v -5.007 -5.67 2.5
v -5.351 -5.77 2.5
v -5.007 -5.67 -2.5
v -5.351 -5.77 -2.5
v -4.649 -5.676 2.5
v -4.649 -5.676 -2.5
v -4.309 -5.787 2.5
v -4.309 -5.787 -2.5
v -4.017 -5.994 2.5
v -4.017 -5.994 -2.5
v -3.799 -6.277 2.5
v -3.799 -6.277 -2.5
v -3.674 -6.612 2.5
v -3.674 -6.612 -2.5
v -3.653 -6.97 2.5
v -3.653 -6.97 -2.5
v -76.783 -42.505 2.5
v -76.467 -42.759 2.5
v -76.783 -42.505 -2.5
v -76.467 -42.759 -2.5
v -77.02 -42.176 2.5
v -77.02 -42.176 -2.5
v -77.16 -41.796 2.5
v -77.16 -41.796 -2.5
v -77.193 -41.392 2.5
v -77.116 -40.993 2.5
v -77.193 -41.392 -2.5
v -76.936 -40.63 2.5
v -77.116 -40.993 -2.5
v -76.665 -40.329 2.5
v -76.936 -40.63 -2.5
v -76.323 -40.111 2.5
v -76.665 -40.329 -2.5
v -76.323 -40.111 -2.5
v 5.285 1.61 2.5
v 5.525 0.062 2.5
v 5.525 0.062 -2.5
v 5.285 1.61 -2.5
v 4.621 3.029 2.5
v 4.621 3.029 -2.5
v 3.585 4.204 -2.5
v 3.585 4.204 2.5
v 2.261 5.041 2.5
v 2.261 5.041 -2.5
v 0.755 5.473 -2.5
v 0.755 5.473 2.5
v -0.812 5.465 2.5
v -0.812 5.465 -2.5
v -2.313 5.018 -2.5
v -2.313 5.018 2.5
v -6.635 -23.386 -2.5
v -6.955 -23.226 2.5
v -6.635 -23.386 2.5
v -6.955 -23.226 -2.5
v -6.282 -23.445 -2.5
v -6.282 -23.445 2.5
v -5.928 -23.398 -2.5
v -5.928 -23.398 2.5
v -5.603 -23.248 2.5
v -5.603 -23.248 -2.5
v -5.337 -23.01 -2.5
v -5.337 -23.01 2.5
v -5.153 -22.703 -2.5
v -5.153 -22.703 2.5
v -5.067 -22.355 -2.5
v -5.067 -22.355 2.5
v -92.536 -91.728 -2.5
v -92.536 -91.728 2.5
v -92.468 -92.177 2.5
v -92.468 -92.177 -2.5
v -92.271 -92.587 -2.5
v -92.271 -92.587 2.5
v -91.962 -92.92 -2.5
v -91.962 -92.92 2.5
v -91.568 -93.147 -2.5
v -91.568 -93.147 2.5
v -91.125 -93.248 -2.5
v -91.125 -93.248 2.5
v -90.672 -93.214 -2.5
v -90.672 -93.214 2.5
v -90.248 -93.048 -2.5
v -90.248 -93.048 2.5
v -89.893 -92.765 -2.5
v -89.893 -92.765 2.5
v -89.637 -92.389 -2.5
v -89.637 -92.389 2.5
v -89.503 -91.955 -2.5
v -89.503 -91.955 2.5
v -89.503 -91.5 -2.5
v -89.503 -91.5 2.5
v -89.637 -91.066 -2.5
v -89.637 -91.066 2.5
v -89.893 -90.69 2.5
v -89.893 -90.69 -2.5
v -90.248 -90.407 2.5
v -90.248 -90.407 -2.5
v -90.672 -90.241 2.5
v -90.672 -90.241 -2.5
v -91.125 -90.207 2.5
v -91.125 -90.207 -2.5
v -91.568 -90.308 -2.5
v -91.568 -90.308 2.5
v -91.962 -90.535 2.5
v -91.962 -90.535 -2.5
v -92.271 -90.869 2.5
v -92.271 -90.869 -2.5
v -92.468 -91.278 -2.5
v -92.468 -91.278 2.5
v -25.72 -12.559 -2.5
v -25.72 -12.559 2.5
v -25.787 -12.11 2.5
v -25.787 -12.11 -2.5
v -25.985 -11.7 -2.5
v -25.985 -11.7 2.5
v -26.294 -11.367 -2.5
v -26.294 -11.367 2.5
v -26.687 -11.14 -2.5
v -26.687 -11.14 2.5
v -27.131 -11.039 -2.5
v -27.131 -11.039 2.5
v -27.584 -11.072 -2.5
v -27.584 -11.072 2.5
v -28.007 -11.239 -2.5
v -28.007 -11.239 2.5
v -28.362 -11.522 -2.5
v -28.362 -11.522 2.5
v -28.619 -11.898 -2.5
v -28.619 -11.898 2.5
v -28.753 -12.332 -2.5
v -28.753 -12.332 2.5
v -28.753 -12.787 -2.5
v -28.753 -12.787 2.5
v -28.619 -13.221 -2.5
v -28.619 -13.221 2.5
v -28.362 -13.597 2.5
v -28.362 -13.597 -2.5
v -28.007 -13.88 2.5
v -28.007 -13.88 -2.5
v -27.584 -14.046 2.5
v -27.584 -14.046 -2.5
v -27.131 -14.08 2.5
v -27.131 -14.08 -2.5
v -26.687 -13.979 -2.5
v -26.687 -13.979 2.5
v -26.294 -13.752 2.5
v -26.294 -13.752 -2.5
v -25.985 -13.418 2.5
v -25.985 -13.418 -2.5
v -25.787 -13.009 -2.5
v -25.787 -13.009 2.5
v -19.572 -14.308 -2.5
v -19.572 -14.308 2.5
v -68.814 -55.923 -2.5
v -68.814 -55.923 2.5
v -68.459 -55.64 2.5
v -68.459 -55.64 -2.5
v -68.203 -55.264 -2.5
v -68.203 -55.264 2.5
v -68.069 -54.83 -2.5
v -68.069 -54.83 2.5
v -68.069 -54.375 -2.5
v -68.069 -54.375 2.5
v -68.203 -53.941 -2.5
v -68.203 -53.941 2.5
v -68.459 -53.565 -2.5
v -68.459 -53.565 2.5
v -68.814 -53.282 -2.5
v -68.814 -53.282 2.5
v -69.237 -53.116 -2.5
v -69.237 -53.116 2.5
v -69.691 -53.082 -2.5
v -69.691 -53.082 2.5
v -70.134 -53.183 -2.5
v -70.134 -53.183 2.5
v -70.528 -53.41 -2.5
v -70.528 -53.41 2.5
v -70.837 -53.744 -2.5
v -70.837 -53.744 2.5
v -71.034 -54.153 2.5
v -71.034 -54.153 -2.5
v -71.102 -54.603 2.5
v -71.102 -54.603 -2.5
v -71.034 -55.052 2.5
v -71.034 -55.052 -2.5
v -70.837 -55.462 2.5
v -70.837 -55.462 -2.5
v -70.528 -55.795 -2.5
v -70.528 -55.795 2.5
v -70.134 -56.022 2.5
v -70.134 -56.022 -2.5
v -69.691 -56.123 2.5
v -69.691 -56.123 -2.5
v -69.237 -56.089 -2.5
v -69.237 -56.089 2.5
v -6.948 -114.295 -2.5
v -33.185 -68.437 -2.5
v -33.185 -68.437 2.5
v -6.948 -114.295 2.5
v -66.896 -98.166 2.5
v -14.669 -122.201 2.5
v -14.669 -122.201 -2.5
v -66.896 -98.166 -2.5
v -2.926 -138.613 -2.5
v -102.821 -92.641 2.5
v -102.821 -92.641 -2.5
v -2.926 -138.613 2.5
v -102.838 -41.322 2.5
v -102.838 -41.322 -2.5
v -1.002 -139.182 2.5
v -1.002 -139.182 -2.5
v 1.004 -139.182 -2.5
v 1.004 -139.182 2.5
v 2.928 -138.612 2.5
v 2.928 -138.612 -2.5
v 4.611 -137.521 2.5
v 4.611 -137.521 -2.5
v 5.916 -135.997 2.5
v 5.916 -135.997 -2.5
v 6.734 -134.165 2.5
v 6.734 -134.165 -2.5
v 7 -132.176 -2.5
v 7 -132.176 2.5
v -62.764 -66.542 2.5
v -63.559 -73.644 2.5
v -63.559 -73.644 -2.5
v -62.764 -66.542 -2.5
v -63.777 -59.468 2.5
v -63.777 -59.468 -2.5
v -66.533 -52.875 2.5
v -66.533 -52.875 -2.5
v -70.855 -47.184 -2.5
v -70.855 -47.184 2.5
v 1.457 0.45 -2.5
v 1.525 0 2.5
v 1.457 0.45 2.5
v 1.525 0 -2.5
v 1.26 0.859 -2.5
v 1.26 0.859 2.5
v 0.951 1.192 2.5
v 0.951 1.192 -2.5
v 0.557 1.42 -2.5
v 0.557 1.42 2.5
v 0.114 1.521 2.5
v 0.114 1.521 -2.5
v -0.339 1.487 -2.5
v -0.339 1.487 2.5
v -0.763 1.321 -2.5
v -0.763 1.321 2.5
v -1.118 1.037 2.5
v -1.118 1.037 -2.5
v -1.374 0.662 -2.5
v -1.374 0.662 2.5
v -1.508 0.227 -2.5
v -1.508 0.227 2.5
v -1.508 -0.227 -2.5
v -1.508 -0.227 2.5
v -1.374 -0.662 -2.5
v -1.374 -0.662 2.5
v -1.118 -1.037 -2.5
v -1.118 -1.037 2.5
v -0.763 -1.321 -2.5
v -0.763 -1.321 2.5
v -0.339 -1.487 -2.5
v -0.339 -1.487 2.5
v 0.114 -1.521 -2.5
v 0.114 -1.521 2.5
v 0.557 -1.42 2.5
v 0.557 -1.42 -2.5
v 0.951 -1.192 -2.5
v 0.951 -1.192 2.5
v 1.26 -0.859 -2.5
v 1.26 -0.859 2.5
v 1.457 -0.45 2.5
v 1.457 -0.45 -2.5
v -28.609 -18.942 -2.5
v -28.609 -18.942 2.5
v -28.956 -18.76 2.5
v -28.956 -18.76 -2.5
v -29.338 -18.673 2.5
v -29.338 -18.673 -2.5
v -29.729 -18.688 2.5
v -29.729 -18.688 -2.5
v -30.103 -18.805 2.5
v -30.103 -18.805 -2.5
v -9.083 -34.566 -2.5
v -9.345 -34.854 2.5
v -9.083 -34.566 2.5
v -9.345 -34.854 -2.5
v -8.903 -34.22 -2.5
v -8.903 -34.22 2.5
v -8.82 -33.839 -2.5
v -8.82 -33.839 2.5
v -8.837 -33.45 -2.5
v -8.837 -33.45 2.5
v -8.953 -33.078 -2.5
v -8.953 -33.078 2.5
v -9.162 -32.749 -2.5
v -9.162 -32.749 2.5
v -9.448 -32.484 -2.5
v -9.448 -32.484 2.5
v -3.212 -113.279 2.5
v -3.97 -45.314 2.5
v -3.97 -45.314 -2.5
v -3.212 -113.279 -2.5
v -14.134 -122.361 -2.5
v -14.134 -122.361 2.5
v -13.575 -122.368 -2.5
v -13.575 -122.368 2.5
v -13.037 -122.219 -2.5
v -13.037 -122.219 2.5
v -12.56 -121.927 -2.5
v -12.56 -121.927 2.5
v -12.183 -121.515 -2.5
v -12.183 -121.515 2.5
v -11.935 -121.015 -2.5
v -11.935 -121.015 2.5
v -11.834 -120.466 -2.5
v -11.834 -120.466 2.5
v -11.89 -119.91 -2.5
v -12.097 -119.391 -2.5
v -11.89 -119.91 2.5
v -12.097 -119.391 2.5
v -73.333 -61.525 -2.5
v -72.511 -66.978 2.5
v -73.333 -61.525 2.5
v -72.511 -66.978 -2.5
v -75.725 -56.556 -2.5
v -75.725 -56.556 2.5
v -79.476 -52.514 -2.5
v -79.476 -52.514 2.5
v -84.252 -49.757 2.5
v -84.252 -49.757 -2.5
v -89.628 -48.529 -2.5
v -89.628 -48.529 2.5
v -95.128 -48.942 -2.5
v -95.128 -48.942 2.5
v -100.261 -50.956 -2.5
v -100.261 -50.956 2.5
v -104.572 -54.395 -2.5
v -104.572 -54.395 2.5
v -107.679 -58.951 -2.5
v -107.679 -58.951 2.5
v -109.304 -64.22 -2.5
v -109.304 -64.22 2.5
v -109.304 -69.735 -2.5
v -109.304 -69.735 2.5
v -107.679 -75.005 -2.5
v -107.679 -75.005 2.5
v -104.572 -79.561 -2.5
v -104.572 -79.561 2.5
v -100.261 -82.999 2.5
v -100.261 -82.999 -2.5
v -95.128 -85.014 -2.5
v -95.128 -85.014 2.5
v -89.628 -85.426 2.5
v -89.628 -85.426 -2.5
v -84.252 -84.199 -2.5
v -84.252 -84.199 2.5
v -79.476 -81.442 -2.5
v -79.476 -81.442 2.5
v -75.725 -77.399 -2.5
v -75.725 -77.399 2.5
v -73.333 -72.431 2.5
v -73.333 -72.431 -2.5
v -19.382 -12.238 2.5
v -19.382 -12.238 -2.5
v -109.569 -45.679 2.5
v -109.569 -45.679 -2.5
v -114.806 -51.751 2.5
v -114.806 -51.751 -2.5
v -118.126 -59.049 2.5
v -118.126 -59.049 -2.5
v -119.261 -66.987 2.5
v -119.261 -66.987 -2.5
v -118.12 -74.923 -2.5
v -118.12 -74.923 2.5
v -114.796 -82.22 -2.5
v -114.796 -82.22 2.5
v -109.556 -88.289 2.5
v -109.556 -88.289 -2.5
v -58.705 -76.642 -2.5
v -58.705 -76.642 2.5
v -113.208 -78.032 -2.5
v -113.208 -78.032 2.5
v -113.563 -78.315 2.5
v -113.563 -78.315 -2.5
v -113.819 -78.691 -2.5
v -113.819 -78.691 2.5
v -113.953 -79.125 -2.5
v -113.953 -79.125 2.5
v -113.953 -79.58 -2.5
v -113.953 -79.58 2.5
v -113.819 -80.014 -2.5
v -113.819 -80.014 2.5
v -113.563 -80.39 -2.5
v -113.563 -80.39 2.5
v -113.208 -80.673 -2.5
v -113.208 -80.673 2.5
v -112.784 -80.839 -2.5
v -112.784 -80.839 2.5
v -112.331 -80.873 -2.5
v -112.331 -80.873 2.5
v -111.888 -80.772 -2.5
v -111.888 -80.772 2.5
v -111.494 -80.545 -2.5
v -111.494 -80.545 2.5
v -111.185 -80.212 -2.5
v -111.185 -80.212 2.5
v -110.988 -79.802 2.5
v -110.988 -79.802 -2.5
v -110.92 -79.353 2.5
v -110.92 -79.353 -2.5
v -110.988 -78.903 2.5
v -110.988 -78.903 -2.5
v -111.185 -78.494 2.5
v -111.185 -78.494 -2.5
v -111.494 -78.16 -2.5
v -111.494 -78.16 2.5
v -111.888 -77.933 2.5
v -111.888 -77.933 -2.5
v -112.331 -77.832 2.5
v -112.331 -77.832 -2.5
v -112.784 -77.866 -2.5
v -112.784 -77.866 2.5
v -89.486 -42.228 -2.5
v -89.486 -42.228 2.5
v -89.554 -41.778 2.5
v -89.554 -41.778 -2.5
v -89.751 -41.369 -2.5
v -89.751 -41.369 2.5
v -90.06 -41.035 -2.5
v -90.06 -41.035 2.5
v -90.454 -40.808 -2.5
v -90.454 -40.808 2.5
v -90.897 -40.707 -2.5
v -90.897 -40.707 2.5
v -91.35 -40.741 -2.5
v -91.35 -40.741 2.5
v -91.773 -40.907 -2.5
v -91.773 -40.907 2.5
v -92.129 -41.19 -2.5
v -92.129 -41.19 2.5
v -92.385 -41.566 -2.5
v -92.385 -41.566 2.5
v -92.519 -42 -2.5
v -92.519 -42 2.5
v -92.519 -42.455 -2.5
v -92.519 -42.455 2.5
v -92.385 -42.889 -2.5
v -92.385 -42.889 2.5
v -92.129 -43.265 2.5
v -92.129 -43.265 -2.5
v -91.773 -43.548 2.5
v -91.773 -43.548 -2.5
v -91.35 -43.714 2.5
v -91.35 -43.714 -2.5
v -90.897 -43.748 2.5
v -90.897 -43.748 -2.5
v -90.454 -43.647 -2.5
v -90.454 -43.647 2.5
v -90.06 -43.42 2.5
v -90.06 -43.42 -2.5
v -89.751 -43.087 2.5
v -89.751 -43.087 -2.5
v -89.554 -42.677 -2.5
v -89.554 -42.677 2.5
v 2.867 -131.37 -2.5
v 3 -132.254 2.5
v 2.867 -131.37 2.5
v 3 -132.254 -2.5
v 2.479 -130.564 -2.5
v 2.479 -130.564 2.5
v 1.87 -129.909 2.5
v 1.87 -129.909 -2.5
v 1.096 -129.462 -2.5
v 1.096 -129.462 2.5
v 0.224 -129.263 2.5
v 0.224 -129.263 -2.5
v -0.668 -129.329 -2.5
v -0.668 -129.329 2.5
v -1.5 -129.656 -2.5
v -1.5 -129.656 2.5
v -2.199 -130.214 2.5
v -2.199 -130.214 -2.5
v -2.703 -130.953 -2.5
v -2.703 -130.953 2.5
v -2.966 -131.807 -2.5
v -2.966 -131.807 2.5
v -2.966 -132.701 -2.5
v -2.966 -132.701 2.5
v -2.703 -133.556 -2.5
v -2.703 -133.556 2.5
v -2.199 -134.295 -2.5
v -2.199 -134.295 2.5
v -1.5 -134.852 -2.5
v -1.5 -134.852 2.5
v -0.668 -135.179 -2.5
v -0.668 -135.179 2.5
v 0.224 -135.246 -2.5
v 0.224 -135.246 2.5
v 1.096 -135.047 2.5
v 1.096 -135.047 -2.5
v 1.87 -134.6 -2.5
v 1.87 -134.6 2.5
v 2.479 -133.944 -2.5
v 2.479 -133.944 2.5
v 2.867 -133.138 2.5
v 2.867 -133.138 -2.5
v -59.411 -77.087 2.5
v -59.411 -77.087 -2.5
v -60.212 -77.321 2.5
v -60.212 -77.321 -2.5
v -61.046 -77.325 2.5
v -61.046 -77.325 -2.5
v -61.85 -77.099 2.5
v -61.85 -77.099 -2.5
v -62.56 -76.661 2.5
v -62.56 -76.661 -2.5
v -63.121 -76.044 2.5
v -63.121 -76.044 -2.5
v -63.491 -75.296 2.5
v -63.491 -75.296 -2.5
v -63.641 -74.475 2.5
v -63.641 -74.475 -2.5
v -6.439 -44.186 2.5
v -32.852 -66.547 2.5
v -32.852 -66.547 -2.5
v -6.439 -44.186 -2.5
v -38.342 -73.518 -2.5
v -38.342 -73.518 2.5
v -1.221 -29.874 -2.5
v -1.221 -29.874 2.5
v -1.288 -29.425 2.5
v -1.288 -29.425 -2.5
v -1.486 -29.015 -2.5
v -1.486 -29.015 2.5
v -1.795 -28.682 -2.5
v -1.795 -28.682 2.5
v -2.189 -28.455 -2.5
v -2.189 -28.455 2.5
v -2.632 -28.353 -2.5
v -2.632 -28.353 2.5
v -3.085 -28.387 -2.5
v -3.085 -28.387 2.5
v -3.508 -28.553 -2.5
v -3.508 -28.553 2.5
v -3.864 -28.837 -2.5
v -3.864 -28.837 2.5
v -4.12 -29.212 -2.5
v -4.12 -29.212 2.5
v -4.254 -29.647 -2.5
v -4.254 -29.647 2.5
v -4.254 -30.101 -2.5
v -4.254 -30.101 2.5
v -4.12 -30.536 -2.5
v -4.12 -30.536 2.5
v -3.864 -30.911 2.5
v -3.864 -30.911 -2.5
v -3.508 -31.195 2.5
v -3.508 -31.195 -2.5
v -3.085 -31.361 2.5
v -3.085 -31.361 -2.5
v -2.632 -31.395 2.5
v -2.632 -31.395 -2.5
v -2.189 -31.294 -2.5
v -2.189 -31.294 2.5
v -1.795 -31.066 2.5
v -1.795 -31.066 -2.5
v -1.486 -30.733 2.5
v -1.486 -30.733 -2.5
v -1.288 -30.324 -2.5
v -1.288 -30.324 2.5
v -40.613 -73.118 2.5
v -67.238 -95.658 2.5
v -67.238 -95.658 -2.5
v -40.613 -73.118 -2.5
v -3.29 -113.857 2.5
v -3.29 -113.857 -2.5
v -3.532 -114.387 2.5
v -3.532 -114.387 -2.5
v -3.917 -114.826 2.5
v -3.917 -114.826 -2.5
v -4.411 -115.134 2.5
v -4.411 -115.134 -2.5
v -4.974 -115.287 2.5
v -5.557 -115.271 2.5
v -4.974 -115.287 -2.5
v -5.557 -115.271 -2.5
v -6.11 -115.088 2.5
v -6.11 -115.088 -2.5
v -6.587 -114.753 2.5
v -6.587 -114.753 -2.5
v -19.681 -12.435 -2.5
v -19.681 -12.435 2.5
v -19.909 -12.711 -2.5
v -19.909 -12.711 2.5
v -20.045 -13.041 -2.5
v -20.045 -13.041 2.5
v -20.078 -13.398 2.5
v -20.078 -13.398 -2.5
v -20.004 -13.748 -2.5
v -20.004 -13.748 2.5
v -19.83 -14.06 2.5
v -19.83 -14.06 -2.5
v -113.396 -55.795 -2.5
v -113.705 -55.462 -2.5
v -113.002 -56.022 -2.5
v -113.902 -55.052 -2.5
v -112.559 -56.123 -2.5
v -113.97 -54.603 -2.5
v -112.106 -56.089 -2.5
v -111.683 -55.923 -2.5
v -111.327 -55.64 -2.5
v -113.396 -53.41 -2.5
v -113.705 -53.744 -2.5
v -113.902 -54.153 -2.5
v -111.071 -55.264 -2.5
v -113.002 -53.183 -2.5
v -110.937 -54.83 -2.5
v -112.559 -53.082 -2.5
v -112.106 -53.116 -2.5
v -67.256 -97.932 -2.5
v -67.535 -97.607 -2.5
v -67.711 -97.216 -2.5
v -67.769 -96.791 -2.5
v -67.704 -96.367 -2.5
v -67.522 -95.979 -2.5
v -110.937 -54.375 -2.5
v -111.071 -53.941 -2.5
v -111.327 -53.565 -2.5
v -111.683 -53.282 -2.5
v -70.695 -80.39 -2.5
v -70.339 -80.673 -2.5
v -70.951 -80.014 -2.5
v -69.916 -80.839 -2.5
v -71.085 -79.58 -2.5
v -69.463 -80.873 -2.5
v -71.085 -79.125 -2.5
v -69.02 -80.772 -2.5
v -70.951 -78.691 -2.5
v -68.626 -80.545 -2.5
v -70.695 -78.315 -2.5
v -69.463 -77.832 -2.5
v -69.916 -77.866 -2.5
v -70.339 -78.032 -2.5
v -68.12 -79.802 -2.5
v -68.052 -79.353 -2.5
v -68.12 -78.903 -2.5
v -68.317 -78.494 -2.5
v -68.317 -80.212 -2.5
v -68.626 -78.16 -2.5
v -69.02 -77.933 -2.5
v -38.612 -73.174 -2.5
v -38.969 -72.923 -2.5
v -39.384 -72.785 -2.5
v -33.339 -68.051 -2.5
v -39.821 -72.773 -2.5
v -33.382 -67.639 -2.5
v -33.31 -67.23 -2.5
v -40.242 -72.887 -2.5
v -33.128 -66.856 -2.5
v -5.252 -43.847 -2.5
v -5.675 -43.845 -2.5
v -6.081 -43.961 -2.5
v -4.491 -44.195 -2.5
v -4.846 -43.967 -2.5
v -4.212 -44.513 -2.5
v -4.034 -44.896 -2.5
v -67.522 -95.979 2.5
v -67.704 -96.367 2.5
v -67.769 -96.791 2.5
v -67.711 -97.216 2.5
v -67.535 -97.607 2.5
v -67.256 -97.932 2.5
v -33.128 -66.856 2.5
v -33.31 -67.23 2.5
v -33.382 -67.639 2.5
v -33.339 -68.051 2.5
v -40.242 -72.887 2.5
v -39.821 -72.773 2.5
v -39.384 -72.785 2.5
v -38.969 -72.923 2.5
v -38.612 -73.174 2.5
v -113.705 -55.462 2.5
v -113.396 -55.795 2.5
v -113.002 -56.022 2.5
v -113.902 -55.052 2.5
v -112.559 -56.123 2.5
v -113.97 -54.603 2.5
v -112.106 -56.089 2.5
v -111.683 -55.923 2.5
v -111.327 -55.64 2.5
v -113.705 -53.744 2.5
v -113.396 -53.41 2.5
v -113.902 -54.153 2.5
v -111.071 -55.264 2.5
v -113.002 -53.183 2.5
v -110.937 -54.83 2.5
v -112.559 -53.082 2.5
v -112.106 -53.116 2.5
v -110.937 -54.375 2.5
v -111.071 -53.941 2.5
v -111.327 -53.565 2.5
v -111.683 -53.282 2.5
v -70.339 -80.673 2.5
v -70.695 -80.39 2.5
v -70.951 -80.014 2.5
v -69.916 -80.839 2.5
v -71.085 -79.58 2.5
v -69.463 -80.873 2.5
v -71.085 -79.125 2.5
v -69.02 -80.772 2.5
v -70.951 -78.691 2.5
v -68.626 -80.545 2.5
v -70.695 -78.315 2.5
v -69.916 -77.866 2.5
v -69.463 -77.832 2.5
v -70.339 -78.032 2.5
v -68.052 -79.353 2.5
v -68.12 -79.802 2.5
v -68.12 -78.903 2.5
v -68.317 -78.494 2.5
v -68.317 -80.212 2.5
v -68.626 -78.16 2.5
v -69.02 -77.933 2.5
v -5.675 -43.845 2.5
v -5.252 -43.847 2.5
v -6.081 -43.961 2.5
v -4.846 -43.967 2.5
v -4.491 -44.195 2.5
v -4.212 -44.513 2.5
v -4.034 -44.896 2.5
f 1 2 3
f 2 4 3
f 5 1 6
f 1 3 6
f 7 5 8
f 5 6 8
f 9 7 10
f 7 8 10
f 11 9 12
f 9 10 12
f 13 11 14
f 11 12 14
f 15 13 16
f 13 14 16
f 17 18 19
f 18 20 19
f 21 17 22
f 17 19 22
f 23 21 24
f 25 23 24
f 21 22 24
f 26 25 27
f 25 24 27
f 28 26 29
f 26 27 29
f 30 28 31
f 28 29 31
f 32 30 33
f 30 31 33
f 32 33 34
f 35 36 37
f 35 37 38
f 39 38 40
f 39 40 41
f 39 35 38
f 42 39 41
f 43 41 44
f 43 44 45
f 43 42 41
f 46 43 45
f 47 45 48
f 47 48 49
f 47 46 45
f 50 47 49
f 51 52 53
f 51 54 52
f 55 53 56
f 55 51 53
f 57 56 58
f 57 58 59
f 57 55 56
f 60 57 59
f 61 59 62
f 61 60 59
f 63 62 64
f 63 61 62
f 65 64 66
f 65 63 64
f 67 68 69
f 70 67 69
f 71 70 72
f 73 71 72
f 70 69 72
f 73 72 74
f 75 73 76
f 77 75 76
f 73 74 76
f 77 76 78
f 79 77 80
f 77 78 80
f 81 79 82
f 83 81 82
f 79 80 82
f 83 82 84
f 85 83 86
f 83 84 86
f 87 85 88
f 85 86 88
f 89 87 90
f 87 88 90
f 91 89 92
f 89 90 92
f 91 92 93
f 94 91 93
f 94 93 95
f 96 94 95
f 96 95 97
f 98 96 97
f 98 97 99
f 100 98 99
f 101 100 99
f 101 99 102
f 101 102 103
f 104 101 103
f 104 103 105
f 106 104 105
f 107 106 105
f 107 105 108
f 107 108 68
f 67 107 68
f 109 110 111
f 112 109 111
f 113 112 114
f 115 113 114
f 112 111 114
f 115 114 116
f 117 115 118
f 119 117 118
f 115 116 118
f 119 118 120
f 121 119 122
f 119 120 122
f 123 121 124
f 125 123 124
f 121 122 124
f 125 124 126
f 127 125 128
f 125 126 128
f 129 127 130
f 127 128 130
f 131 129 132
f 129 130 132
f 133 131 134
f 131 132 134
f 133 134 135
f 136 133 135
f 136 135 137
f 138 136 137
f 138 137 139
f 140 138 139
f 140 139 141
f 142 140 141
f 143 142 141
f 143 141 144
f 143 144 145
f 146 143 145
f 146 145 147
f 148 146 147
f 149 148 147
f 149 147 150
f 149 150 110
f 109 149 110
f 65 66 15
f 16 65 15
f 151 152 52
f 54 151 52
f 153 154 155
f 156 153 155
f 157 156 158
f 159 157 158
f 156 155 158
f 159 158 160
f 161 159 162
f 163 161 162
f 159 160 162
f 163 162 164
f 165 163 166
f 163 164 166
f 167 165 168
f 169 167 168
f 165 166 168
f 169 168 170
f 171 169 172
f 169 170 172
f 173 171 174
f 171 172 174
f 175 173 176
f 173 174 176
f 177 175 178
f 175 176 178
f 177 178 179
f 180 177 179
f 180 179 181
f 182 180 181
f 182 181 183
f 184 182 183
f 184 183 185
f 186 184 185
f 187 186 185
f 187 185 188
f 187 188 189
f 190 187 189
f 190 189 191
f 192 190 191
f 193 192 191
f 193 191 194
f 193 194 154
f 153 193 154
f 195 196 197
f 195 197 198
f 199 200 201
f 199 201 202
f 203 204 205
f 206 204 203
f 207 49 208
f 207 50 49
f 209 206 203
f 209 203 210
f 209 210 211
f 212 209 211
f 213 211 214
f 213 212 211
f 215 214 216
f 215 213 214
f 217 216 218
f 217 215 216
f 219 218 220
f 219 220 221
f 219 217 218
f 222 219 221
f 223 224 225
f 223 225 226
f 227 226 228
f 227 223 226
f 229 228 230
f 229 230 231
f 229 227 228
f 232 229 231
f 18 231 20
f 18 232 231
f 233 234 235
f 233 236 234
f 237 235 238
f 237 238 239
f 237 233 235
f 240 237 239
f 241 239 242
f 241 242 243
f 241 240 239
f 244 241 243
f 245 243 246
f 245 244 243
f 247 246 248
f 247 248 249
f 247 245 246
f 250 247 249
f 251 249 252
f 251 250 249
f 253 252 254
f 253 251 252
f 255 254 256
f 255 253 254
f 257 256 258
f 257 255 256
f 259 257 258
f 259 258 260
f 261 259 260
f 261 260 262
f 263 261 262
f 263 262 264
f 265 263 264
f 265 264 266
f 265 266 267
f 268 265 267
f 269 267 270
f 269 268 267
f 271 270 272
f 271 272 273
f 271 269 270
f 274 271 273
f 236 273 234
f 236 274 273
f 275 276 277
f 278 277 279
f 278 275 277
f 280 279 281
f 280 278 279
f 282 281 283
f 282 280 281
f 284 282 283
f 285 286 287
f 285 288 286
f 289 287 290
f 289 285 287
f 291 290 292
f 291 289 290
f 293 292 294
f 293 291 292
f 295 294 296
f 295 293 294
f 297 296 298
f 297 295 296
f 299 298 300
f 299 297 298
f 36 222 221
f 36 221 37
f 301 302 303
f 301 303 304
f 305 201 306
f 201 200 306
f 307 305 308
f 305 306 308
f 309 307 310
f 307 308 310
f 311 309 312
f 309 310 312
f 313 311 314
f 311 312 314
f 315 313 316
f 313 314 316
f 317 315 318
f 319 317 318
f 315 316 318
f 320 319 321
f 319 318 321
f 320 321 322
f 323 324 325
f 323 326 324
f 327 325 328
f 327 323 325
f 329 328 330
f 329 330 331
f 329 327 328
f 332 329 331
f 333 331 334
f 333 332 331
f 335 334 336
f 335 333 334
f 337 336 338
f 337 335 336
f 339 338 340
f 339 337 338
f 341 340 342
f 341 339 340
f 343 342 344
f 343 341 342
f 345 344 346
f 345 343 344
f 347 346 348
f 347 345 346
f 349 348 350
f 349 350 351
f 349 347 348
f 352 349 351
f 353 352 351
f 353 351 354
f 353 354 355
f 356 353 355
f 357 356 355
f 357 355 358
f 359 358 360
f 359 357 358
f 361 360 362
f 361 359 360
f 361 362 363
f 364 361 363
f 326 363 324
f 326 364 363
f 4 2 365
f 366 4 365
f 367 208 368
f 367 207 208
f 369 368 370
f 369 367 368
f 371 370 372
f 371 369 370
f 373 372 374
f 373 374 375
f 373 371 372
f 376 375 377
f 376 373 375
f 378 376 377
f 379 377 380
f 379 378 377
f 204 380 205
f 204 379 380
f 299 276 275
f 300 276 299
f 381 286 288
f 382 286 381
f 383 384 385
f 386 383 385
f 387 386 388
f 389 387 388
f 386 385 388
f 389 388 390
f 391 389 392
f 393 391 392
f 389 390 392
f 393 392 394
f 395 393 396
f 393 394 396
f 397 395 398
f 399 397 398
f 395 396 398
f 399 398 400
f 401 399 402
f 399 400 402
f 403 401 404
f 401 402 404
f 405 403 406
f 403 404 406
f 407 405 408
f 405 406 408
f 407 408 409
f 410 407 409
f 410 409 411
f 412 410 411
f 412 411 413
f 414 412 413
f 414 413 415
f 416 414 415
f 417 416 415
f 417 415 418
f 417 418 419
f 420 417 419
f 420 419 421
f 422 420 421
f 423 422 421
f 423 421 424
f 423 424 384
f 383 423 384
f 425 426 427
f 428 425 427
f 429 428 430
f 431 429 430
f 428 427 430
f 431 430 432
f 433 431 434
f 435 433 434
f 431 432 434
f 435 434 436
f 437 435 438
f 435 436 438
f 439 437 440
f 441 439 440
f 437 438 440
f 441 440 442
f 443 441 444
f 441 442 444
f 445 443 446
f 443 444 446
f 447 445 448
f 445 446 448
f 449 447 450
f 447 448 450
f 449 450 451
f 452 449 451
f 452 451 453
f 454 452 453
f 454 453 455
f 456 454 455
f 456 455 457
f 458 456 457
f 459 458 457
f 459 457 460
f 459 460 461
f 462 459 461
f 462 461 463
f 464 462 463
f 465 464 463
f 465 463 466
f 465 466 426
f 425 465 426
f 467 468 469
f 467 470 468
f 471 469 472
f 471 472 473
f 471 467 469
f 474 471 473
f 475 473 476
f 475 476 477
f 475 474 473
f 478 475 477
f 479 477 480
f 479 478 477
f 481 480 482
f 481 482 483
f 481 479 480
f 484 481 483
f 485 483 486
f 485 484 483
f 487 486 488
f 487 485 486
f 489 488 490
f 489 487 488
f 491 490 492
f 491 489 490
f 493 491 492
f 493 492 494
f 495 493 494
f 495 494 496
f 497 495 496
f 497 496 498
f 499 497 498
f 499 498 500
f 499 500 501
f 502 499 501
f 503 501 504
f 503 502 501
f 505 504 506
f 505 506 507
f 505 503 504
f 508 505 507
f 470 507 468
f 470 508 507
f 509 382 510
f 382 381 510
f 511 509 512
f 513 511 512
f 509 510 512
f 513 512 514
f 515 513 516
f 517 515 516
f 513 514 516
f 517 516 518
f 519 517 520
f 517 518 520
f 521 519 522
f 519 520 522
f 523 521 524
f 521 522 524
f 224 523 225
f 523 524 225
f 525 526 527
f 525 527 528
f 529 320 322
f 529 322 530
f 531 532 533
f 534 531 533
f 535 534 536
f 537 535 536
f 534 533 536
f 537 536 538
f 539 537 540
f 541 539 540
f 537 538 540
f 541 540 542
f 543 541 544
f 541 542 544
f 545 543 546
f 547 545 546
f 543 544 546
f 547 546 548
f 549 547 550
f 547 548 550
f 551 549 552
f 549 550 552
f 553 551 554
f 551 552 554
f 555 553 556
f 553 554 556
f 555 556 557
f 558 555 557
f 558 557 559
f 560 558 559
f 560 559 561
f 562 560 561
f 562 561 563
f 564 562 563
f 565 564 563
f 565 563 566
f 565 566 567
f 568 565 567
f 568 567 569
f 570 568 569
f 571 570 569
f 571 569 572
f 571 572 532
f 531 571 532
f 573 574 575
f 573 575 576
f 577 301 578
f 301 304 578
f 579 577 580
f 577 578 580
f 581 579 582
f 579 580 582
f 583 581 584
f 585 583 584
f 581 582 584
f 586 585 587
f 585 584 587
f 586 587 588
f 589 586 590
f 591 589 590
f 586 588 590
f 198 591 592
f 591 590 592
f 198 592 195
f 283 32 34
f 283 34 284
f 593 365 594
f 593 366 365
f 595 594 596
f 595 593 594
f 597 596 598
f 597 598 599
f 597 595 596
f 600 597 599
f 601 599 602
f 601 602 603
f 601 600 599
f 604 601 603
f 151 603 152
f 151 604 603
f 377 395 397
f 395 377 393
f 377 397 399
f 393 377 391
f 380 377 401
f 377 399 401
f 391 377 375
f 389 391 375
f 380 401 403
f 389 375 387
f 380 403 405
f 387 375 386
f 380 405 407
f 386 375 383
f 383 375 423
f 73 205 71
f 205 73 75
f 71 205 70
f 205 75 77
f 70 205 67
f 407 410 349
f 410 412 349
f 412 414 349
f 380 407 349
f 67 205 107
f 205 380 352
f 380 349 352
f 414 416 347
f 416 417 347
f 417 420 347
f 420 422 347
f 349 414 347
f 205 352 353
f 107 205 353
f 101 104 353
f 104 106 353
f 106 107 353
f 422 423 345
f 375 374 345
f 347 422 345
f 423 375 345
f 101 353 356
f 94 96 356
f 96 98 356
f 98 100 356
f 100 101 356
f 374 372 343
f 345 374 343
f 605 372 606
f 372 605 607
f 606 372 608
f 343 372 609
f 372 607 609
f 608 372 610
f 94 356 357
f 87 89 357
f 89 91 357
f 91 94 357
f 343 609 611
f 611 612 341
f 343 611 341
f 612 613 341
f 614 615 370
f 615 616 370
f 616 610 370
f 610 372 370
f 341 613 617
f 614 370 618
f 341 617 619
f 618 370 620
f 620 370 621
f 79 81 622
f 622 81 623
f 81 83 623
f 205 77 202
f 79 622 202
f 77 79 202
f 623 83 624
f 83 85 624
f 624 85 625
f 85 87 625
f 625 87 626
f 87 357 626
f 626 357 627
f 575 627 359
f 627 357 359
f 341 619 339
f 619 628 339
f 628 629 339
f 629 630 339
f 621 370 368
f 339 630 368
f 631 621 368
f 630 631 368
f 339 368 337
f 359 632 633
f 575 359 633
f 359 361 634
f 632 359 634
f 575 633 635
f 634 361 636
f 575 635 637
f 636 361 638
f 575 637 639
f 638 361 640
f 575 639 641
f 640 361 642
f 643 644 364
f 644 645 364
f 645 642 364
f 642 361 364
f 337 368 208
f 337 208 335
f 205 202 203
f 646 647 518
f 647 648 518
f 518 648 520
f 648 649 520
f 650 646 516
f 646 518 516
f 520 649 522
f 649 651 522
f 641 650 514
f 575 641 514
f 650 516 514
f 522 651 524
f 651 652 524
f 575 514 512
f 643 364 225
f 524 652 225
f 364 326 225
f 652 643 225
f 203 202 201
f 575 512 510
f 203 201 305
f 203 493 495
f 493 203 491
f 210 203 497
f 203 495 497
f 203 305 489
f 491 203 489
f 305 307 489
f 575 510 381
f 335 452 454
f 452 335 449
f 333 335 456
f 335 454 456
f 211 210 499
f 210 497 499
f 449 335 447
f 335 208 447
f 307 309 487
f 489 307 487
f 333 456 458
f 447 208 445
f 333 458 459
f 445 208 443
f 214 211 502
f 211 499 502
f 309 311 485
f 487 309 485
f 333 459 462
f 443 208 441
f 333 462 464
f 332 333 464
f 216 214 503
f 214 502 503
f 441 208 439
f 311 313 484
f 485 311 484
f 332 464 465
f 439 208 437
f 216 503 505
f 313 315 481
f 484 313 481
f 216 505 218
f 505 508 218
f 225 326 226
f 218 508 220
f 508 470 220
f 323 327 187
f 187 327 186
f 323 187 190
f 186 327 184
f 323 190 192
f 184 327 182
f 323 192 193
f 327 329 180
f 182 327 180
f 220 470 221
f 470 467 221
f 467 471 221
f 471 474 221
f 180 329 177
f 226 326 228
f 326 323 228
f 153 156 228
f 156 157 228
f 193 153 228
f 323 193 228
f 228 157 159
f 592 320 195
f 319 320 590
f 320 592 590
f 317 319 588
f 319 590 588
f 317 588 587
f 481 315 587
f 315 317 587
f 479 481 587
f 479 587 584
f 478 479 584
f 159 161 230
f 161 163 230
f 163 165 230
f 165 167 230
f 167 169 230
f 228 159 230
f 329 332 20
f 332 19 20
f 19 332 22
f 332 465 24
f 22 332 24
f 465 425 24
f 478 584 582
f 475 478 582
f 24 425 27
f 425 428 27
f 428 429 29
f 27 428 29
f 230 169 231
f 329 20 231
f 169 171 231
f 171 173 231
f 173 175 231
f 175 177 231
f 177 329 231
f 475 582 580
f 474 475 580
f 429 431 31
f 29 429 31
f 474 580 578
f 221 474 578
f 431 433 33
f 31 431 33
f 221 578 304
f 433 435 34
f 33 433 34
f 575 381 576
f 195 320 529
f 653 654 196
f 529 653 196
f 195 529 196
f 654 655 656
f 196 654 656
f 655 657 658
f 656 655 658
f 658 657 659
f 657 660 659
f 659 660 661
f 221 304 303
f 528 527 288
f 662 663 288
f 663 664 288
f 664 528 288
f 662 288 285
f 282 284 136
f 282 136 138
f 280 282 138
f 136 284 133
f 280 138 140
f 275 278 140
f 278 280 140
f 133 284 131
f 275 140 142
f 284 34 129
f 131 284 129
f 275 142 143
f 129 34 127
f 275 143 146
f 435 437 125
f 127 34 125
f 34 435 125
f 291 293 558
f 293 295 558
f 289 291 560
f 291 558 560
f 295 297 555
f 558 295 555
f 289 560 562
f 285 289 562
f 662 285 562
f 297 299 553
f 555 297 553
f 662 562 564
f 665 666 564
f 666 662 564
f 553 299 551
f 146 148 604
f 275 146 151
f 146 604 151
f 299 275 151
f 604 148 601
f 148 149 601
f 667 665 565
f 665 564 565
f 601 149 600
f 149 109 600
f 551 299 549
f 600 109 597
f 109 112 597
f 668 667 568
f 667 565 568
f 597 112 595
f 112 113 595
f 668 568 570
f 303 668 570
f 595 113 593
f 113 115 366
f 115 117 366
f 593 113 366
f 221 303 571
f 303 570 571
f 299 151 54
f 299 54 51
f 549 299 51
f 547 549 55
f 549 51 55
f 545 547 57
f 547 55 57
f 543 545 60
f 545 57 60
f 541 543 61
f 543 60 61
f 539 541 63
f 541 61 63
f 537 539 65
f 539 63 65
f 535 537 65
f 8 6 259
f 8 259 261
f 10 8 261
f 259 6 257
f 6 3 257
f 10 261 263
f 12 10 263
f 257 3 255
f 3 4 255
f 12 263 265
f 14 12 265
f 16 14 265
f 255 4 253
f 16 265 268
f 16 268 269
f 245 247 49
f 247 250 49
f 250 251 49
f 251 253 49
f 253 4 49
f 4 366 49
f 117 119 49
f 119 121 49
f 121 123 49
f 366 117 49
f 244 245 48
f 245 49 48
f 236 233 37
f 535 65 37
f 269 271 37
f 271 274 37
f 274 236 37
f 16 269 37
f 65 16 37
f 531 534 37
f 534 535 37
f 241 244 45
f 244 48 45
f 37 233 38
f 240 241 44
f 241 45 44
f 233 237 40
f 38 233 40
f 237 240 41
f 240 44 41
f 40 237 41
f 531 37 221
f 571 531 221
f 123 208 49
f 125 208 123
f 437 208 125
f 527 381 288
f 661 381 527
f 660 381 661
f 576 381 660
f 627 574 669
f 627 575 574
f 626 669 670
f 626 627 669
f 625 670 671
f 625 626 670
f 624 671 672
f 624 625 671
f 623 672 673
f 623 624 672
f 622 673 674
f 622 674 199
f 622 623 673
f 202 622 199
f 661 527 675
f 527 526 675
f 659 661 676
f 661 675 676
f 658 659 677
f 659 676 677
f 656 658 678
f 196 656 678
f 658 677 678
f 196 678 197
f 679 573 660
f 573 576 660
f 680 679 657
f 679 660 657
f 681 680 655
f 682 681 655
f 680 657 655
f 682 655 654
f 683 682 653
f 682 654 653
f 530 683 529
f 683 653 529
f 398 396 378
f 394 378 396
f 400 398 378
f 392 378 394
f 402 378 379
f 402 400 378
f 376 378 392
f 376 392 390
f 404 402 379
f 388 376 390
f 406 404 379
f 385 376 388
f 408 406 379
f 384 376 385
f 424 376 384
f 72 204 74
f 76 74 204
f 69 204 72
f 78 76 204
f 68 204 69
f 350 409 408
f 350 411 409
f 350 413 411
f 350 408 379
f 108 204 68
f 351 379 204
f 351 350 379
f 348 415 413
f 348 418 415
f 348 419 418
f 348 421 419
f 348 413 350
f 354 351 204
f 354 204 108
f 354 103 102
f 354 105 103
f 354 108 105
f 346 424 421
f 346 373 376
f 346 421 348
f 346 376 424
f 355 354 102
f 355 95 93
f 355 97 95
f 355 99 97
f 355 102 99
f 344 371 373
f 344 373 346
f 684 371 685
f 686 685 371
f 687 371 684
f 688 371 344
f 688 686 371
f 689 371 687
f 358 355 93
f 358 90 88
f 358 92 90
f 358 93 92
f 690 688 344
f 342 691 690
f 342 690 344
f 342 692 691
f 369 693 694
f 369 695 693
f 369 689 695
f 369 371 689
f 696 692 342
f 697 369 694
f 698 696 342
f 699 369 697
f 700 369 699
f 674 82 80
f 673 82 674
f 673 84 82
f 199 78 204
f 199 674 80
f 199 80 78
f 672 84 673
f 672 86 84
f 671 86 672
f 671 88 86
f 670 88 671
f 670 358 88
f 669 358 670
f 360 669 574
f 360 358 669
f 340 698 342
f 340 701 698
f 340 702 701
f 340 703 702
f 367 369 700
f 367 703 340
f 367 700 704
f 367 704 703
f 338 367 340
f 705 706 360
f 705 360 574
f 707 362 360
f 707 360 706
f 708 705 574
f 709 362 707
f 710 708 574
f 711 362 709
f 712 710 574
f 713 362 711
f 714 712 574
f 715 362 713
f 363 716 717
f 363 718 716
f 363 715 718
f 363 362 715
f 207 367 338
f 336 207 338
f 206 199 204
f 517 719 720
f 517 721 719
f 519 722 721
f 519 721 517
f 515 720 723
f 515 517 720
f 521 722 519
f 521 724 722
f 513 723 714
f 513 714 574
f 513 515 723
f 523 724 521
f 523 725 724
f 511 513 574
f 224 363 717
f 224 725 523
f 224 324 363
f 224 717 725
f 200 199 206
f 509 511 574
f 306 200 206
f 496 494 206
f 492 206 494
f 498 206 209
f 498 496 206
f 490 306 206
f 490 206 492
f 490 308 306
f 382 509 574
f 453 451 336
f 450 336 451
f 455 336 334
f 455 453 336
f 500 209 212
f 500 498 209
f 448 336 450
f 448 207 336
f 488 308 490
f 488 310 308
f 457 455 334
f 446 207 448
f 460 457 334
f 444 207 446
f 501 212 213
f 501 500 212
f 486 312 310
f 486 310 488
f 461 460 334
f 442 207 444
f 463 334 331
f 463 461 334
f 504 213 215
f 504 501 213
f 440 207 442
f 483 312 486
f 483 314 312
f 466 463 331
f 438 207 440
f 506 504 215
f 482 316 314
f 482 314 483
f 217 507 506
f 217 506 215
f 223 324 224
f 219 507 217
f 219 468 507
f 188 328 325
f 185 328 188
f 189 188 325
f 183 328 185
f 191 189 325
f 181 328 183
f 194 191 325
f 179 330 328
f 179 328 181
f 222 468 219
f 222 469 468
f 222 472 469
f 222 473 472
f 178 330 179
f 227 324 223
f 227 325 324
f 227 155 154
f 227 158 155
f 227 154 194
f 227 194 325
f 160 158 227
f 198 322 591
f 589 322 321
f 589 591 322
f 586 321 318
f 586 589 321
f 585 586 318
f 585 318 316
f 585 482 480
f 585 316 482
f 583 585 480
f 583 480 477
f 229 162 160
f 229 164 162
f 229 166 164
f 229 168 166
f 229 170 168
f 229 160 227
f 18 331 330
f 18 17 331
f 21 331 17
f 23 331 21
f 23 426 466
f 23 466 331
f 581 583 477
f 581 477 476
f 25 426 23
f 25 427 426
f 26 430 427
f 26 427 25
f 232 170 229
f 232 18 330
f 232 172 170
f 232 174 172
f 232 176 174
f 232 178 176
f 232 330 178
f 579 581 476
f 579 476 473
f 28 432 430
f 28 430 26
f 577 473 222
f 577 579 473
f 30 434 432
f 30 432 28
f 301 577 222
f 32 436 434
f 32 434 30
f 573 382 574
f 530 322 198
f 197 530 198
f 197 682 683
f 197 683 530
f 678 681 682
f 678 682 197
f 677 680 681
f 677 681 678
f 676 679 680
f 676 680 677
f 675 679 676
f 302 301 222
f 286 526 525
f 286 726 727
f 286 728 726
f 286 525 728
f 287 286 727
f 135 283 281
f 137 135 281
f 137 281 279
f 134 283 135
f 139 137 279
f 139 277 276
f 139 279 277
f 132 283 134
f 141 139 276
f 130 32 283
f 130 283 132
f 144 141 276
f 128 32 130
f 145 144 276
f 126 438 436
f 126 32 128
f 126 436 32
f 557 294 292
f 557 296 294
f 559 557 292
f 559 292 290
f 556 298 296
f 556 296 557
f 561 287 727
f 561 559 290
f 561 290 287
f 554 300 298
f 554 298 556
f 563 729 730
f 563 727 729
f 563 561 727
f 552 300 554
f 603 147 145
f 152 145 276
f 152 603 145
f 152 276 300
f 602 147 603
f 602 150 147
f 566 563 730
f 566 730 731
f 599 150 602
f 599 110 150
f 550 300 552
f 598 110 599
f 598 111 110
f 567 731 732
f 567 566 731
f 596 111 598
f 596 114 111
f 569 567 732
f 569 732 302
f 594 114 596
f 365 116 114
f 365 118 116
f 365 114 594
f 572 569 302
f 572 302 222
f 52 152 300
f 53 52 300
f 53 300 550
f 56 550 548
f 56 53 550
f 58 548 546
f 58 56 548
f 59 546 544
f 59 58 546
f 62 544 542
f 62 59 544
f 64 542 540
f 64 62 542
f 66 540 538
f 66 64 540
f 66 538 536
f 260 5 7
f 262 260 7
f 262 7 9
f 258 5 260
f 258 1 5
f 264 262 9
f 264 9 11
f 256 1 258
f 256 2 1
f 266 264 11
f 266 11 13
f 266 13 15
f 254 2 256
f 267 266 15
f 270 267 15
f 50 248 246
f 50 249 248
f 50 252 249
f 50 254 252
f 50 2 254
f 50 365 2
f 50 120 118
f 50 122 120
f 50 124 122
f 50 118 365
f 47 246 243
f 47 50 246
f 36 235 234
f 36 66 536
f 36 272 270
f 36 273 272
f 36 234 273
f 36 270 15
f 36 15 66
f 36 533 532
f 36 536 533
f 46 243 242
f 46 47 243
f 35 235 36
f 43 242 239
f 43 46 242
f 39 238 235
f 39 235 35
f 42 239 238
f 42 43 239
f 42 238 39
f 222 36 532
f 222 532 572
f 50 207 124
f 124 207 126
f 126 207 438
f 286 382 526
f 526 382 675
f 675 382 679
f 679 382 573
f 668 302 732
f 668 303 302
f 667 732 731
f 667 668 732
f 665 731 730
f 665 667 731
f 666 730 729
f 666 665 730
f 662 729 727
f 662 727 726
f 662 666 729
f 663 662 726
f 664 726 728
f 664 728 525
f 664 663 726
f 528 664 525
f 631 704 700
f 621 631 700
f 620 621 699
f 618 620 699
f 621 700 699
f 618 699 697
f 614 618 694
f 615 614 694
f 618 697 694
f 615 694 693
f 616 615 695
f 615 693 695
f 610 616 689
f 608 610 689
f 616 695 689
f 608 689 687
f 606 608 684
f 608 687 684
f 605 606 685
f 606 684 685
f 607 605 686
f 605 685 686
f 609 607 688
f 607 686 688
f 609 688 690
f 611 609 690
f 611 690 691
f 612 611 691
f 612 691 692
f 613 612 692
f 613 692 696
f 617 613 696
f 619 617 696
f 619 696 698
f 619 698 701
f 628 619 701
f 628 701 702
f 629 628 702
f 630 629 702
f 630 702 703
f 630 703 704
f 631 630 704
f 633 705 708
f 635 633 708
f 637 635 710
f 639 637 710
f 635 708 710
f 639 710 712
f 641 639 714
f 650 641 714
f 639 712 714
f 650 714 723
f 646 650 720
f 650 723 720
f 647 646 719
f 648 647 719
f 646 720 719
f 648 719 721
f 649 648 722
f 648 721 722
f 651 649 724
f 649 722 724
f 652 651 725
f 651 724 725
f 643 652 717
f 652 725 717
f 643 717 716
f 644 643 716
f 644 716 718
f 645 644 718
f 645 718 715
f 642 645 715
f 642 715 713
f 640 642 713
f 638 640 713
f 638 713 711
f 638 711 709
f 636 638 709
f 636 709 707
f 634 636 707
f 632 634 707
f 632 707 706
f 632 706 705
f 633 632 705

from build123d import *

# Parameters (mm, degrees)
SKETCH_1_R               = 18.5
SKETCH_1_R_2             = 1.525
SKETCH_1_R_3             = 3
EXTRUDE_1_DEPTH          = 2.5
SKETCH_4_R               = 1.525
CUT_EXTRUDE_3_DEPTH      = 10
PATTERN_CIRCULAR_2_COUNT = 6
SKETCH_5_R               = 1.525
CUT_EXTRUDE_4_DEPTH      = 31.54
CUT_EXTRUDE_5_DEPTH      = 31.54
EXTRUDE_2_DEPTH          = 5
EXTRUDE_3_DEPTH          = 5
FILLET_2_R               = 1.5
FILLET_2_2_R             = 3
CUT_EXTRUDE_7_DEPTH      = 5
FILLET_4_R               = 1.2
FILLET_5_R               = 2


with BuildPart() as part:
    # Sketch 1 → Extrude 1 (new body, symmetric)
    with BuildSketch(Plane.XY):
        with BuildLine():
            Line((-102.821191847, -92.640522116), (-2.926441218, -138.613082375))
            ThreePointArc((-2.926441218, -138.613082375), (3.8087152, -138.127288993), (6.999564642, -132.176086843))
            Line((6.999564642, -132.176086843), (5.524656378, 0.061619046))
            ThreePointArc((5.524656378, 0.061619046), (2.952791693, 4.66975869), (-2.312992999, 5.01753808))
            Line((-2.312992999, 5.01753808), (-102.837527006, -41.322427799))
            ThreePointArc((-102.837527006, -41.322427799), (-119.260909787, -66.986705315), (-102.821191847, -92.640522116))
        make_face()
        with Locations((-91.010911218, -66.977713005)):
            Circle(SKETCH_1_R, mode=Mode.SUBTRACT)
        Circle(SKETCH_1_R_2, mode=Mode.SUBTRACT)
        with Locations((0, -132.254156223)):
            Circle(SKETCH_1_R_3, mode=Mode.SUBTRACT)
    extrude(amount=EXTRUDE_1_DEPTH, both=True)

    # Sketch 4 → Cut-Extrude 3 (cut)
    with BuildSketch(Plane.XY.offset(2.5)):
        with Locations((-91.010911218, -42.227713005)):
            Circle(SKETCH_4_R)
    cut_extrude_3 = extrude(amount=-CUT_EXTRUDE_3_DEPTH, mode=Mode.SUBTRACT)

    # Pattern Circular 2: Cut-Extrude 3 ×6 about axis
    pattern_circular_2_axis = Axis((-91.010911218, -66.977713005, 0), (0, 0, 1))
    for i in range(1, PATTERN_CIRCULAR_2_COUNT):
        add(cut_extrude_3.rotate(pattern_circular_2_axis, i * 360 / PATTERN_CIRCULAR_2_COUNT), mode=Mode.SUBTRACT)

    # Sketch 5 → Cut-Extrude 4 (cut)
    with BuildSketch(Plane.XY.offset(2.5)):
        with Locations((-2.745656165, -29.87409199)):
            Circle(SKETCH_5_R)
        with Locations((-27.244550661, -12.559238006)):
            Circle(SKETCH_5_R)
    extrude(amount=-CUT_EXTRUDE_4_DEPTH, mode=Mode.SUBTRACT)

    # Sketch 6 → Cut-Extrude 5 (cut)
    with BuildSketch(Plane.XY.offset(2.5)):
        with BuildLine():
            Line((-79.067859687, -41.376423581), (-29.316651197, -18.44202924))
            Line((-29.316651197, -18.44202924), (-4.070575386, -36.284961557))
            Line((-4.070575386, -36.284961557), (-3.117843226, -121.705267485))
            ThreePointArc((-3.117843226, -121.705267485), (-5.985123886, -123.024947586), (-8.359603594, -125.104538908))
            Line((-8.359603594, -125.104538908), (-79.051563719, -92.57139401))
            ThreePointArc((-79.051563719, -92.57139401), (-62.760912649, -66.968720694), (-79.067859687, -41.376423581))
        make_face()
    extrude(amount=-CUT_EXTRUDE_5_DEPTH, mode=Mode.SUBTRACT)

    # Sketch 7 → Extrude 2 (add)
    with BuildSketch(Plane.XY.offset(2.5)):
        with BuildLine():
            Line((-73.548163223, -95.104113791), (-69.036338231, -97.180500639))
            Line((-69.036338231, -97.180500639), (-4.005429036, -42.12586983))
            Line((-4.005429036, -42.12586983), (-4.070575386, -36.284961557))
            Line((-4.070575386, -36.284961557), (-7.866276061, -33.602309776))
            Line((-7.866276061, -33.602309776), (-72.757541368, -88.538719222))
            ThreePointArc((-72.757541368, -88.538719222), (-75.770580222, -90.764154755), (-79.051563719, -92.57139401))
            Line((-79.051563719, -92.57139401), (-73.548163223, -95.104113791))
        make_face()
    extrude(amount=-EXTRUDE_2_DEPTH)

    # Sketch 8 → Extrude 3 (add)
    with BuildSketch(Plane(origin=(0, 0, -2.5), x_dir=(-1, 0, 0), z_dir=(0, 0, -1))):
        Polygon((7.967241055, -126.608441364), (39.55881203, -71.391285075), (33.804329575, -67.353372997), (1.891384262, -123.132241683), align=None)
    extrude(amount=-EXTRUDE_3_DEPTH)

    # Fillet 2
    fillet_2_edges = [part.edges().sort_by_distance(p)[0] for p in [
        (-69.036338231, -97.180500639, 0),
        (-39.237437692, -71.952997472, 0),
        (-33.804329575, -67.353372997, 0),
        (-4.005429036, -42.12586983, 0),
        (-7.866276061, -33.602309776, 0),
        (-79.067859687, -41.376423581, 0),
        (-29.316651197, -18.44202924, 0),
    ]]
    fillet(fillet_2_edges, radius=FILLET_2_R)

    # Fillet 2 2
    fillet_2_2_edges = [part.edges().sort_by_distance(p)[0] for p in [
        (-72.757541368, -88.538719222, 0),
    ]]
    fillet(fillet_2_2_edges, radius=FILLET_2_2_R)

    # Sketch 12 → Cut-Extrude 7 (cut)
    with BuildSketch(Plane.XY.offset(2.5)):
        Polygon((-3.462970797, -4.899778899), (-21.269732263, -13.108369239), (-5.257503766, -24.425181858), align=None)
    extrude(amount=-CUT_EXTRUDE_7_DEPTH, mode=Mode.SUBTRACT)

    # Fillet 4
    fillet_4_edges = [part.edges().sort_by_distance(p)[0] for p in [
        (-3.462970797, -4.899778899, 0),
        (-5.257503766, -24.425181858, 0),
        (-21.269732263, -13.108369239, 0),
    ]]
    fillet(fillet_4_edges, radius=FILLET_4_R)

    # Fillet 5
    fillet_5_edges = [part.edges().sort_by_distance(p)[0] for p in [
        (-8.994965293, -124.812139119, 0),
        (-3.125995679, -120.974332802, 0),
    ]]
    fillet(fillet_5_edges, radius=FILLET_5_R)


solid = part.part
